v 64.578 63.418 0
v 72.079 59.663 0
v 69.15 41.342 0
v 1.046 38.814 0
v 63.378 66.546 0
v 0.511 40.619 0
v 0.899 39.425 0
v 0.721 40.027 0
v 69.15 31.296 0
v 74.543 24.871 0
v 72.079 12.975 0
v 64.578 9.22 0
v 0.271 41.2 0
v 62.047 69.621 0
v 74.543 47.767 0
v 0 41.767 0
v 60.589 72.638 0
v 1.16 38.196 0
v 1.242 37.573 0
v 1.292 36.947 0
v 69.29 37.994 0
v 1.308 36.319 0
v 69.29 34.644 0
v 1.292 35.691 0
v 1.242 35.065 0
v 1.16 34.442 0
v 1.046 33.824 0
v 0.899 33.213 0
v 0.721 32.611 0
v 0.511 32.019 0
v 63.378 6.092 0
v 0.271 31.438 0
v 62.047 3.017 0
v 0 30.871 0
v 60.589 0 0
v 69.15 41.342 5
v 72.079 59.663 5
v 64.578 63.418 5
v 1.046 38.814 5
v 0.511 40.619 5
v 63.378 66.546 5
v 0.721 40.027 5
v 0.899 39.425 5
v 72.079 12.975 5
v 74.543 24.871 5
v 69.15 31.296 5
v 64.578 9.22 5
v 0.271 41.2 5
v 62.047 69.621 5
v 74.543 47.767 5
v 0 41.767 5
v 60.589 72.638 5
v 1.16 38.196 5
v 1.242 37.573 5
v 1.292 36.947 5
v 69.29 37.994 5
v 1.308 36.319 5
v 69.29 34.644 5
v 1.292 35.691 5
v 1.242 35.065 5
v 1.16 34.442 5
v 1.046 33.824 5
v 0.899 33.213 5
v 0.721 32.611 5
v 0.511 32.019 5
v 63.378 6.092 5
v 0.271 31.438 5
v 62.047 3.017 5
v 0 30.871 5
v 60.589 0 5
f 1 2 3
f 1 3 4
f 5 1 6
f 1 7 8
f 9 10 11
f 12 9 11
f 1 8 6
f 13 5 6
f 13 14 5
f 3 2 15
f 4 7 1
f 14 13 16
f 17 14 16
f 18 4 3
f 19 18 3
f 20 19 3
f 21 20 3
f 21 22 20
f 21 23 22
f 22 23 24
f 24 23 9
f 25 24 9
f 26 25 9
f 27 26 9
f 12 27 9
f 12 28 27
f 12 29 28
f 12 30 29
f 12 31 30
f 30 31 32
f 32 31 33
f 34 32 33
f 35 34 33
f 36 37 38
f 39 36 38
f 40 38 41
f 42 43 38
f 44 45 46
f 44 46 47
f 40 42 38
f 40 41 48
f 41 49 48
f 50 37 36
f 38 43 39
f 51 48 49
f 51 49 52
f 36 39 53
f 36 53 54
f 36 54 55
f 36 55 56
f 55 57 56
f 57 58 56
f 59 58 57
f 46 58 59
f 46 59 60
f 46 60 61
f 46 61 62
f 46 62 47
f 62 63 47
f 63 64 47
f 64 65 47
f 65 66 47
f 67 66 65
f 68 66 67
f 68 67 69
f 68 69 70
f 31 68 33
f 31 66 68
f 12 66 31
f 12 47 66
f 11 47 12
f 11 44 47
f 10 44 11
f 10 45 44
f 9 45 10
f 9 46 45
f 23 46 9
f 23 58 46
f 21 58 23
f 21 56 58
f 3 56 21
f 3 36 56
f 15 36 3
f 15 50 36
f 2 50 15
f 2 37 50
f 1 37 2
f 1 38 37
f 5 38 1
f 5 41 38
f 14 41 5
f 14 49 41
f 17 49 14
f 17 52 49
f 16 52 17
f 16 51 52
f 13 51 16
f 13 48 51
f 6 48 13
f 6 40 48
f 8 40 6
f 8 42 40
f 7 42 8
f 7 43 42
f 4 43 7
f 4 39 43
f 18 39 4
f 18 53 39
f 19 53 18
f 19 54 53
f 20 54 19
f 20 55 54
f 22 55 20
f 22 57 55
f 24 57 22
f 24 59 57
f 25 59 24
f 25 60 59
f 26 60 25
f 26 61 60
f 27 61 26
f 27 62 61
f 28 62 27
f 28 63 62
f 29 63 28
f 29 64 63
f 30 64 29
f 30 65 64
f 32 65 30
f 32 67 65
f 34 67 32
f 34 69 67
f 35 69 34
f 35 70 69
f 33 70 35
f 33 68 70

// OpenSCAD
$fn = 32;

// ----------------------------------------------------------------------
// Gear sector: 2 teeth on 54 degrees
// ----------------------------------------------------------------------

// --- parameters (mm) ---
sector_angle = 54;        // sector angle, degrees
root_r = 80;              // root circle radius
tooth_h = 6;              // tooth height over the root circle
teeth = 2;                // number of teeth on the sector
hub_r = 12;               // hub bore radius
plate_t = 5;              // sector thickness, Z
arc_step = 3;             // sampling step of the root/hub arcs, degrees

tip_r = root_r + tooth_h;  // tip circle radius

profile = [[60.589, 0], [62.047, 3.017], [63.378, 6.092], [64.578, 9.22], [72.079, 12.975], [74.543, 24.871], [69.15, 31.296], [69.29, 34.644], [69.29, 37.994], [69.15, 41.342], [74.543, 47.767], [72.079, 59.663], [64.578, 63.418], [63.378, 66.546], [62.047, 69.621], [60.589, 72.638], [0, 41.767], [0.271, 41.2], [0.511, 40.619], [0.721, 40.027], [0.899, 39.425], [1.046, 38.814], [1.16, 38.196], [1.242, 37.573], [1.292, 36.947], [1.308, 36.319], [1.292, 35.691], [1.242, 35.065], [1.16, 34.442], [1.046, 33.824], [0.899, 33.213], [0.721, 32.611], [0.511, 32.019], [0.271, 31.438], [0, 30.871]];  // primary outline, 35 points, counter clockwise

// --- the one profile operation ---
linear_extrude(height = plate_t) polygon(points = profile);
